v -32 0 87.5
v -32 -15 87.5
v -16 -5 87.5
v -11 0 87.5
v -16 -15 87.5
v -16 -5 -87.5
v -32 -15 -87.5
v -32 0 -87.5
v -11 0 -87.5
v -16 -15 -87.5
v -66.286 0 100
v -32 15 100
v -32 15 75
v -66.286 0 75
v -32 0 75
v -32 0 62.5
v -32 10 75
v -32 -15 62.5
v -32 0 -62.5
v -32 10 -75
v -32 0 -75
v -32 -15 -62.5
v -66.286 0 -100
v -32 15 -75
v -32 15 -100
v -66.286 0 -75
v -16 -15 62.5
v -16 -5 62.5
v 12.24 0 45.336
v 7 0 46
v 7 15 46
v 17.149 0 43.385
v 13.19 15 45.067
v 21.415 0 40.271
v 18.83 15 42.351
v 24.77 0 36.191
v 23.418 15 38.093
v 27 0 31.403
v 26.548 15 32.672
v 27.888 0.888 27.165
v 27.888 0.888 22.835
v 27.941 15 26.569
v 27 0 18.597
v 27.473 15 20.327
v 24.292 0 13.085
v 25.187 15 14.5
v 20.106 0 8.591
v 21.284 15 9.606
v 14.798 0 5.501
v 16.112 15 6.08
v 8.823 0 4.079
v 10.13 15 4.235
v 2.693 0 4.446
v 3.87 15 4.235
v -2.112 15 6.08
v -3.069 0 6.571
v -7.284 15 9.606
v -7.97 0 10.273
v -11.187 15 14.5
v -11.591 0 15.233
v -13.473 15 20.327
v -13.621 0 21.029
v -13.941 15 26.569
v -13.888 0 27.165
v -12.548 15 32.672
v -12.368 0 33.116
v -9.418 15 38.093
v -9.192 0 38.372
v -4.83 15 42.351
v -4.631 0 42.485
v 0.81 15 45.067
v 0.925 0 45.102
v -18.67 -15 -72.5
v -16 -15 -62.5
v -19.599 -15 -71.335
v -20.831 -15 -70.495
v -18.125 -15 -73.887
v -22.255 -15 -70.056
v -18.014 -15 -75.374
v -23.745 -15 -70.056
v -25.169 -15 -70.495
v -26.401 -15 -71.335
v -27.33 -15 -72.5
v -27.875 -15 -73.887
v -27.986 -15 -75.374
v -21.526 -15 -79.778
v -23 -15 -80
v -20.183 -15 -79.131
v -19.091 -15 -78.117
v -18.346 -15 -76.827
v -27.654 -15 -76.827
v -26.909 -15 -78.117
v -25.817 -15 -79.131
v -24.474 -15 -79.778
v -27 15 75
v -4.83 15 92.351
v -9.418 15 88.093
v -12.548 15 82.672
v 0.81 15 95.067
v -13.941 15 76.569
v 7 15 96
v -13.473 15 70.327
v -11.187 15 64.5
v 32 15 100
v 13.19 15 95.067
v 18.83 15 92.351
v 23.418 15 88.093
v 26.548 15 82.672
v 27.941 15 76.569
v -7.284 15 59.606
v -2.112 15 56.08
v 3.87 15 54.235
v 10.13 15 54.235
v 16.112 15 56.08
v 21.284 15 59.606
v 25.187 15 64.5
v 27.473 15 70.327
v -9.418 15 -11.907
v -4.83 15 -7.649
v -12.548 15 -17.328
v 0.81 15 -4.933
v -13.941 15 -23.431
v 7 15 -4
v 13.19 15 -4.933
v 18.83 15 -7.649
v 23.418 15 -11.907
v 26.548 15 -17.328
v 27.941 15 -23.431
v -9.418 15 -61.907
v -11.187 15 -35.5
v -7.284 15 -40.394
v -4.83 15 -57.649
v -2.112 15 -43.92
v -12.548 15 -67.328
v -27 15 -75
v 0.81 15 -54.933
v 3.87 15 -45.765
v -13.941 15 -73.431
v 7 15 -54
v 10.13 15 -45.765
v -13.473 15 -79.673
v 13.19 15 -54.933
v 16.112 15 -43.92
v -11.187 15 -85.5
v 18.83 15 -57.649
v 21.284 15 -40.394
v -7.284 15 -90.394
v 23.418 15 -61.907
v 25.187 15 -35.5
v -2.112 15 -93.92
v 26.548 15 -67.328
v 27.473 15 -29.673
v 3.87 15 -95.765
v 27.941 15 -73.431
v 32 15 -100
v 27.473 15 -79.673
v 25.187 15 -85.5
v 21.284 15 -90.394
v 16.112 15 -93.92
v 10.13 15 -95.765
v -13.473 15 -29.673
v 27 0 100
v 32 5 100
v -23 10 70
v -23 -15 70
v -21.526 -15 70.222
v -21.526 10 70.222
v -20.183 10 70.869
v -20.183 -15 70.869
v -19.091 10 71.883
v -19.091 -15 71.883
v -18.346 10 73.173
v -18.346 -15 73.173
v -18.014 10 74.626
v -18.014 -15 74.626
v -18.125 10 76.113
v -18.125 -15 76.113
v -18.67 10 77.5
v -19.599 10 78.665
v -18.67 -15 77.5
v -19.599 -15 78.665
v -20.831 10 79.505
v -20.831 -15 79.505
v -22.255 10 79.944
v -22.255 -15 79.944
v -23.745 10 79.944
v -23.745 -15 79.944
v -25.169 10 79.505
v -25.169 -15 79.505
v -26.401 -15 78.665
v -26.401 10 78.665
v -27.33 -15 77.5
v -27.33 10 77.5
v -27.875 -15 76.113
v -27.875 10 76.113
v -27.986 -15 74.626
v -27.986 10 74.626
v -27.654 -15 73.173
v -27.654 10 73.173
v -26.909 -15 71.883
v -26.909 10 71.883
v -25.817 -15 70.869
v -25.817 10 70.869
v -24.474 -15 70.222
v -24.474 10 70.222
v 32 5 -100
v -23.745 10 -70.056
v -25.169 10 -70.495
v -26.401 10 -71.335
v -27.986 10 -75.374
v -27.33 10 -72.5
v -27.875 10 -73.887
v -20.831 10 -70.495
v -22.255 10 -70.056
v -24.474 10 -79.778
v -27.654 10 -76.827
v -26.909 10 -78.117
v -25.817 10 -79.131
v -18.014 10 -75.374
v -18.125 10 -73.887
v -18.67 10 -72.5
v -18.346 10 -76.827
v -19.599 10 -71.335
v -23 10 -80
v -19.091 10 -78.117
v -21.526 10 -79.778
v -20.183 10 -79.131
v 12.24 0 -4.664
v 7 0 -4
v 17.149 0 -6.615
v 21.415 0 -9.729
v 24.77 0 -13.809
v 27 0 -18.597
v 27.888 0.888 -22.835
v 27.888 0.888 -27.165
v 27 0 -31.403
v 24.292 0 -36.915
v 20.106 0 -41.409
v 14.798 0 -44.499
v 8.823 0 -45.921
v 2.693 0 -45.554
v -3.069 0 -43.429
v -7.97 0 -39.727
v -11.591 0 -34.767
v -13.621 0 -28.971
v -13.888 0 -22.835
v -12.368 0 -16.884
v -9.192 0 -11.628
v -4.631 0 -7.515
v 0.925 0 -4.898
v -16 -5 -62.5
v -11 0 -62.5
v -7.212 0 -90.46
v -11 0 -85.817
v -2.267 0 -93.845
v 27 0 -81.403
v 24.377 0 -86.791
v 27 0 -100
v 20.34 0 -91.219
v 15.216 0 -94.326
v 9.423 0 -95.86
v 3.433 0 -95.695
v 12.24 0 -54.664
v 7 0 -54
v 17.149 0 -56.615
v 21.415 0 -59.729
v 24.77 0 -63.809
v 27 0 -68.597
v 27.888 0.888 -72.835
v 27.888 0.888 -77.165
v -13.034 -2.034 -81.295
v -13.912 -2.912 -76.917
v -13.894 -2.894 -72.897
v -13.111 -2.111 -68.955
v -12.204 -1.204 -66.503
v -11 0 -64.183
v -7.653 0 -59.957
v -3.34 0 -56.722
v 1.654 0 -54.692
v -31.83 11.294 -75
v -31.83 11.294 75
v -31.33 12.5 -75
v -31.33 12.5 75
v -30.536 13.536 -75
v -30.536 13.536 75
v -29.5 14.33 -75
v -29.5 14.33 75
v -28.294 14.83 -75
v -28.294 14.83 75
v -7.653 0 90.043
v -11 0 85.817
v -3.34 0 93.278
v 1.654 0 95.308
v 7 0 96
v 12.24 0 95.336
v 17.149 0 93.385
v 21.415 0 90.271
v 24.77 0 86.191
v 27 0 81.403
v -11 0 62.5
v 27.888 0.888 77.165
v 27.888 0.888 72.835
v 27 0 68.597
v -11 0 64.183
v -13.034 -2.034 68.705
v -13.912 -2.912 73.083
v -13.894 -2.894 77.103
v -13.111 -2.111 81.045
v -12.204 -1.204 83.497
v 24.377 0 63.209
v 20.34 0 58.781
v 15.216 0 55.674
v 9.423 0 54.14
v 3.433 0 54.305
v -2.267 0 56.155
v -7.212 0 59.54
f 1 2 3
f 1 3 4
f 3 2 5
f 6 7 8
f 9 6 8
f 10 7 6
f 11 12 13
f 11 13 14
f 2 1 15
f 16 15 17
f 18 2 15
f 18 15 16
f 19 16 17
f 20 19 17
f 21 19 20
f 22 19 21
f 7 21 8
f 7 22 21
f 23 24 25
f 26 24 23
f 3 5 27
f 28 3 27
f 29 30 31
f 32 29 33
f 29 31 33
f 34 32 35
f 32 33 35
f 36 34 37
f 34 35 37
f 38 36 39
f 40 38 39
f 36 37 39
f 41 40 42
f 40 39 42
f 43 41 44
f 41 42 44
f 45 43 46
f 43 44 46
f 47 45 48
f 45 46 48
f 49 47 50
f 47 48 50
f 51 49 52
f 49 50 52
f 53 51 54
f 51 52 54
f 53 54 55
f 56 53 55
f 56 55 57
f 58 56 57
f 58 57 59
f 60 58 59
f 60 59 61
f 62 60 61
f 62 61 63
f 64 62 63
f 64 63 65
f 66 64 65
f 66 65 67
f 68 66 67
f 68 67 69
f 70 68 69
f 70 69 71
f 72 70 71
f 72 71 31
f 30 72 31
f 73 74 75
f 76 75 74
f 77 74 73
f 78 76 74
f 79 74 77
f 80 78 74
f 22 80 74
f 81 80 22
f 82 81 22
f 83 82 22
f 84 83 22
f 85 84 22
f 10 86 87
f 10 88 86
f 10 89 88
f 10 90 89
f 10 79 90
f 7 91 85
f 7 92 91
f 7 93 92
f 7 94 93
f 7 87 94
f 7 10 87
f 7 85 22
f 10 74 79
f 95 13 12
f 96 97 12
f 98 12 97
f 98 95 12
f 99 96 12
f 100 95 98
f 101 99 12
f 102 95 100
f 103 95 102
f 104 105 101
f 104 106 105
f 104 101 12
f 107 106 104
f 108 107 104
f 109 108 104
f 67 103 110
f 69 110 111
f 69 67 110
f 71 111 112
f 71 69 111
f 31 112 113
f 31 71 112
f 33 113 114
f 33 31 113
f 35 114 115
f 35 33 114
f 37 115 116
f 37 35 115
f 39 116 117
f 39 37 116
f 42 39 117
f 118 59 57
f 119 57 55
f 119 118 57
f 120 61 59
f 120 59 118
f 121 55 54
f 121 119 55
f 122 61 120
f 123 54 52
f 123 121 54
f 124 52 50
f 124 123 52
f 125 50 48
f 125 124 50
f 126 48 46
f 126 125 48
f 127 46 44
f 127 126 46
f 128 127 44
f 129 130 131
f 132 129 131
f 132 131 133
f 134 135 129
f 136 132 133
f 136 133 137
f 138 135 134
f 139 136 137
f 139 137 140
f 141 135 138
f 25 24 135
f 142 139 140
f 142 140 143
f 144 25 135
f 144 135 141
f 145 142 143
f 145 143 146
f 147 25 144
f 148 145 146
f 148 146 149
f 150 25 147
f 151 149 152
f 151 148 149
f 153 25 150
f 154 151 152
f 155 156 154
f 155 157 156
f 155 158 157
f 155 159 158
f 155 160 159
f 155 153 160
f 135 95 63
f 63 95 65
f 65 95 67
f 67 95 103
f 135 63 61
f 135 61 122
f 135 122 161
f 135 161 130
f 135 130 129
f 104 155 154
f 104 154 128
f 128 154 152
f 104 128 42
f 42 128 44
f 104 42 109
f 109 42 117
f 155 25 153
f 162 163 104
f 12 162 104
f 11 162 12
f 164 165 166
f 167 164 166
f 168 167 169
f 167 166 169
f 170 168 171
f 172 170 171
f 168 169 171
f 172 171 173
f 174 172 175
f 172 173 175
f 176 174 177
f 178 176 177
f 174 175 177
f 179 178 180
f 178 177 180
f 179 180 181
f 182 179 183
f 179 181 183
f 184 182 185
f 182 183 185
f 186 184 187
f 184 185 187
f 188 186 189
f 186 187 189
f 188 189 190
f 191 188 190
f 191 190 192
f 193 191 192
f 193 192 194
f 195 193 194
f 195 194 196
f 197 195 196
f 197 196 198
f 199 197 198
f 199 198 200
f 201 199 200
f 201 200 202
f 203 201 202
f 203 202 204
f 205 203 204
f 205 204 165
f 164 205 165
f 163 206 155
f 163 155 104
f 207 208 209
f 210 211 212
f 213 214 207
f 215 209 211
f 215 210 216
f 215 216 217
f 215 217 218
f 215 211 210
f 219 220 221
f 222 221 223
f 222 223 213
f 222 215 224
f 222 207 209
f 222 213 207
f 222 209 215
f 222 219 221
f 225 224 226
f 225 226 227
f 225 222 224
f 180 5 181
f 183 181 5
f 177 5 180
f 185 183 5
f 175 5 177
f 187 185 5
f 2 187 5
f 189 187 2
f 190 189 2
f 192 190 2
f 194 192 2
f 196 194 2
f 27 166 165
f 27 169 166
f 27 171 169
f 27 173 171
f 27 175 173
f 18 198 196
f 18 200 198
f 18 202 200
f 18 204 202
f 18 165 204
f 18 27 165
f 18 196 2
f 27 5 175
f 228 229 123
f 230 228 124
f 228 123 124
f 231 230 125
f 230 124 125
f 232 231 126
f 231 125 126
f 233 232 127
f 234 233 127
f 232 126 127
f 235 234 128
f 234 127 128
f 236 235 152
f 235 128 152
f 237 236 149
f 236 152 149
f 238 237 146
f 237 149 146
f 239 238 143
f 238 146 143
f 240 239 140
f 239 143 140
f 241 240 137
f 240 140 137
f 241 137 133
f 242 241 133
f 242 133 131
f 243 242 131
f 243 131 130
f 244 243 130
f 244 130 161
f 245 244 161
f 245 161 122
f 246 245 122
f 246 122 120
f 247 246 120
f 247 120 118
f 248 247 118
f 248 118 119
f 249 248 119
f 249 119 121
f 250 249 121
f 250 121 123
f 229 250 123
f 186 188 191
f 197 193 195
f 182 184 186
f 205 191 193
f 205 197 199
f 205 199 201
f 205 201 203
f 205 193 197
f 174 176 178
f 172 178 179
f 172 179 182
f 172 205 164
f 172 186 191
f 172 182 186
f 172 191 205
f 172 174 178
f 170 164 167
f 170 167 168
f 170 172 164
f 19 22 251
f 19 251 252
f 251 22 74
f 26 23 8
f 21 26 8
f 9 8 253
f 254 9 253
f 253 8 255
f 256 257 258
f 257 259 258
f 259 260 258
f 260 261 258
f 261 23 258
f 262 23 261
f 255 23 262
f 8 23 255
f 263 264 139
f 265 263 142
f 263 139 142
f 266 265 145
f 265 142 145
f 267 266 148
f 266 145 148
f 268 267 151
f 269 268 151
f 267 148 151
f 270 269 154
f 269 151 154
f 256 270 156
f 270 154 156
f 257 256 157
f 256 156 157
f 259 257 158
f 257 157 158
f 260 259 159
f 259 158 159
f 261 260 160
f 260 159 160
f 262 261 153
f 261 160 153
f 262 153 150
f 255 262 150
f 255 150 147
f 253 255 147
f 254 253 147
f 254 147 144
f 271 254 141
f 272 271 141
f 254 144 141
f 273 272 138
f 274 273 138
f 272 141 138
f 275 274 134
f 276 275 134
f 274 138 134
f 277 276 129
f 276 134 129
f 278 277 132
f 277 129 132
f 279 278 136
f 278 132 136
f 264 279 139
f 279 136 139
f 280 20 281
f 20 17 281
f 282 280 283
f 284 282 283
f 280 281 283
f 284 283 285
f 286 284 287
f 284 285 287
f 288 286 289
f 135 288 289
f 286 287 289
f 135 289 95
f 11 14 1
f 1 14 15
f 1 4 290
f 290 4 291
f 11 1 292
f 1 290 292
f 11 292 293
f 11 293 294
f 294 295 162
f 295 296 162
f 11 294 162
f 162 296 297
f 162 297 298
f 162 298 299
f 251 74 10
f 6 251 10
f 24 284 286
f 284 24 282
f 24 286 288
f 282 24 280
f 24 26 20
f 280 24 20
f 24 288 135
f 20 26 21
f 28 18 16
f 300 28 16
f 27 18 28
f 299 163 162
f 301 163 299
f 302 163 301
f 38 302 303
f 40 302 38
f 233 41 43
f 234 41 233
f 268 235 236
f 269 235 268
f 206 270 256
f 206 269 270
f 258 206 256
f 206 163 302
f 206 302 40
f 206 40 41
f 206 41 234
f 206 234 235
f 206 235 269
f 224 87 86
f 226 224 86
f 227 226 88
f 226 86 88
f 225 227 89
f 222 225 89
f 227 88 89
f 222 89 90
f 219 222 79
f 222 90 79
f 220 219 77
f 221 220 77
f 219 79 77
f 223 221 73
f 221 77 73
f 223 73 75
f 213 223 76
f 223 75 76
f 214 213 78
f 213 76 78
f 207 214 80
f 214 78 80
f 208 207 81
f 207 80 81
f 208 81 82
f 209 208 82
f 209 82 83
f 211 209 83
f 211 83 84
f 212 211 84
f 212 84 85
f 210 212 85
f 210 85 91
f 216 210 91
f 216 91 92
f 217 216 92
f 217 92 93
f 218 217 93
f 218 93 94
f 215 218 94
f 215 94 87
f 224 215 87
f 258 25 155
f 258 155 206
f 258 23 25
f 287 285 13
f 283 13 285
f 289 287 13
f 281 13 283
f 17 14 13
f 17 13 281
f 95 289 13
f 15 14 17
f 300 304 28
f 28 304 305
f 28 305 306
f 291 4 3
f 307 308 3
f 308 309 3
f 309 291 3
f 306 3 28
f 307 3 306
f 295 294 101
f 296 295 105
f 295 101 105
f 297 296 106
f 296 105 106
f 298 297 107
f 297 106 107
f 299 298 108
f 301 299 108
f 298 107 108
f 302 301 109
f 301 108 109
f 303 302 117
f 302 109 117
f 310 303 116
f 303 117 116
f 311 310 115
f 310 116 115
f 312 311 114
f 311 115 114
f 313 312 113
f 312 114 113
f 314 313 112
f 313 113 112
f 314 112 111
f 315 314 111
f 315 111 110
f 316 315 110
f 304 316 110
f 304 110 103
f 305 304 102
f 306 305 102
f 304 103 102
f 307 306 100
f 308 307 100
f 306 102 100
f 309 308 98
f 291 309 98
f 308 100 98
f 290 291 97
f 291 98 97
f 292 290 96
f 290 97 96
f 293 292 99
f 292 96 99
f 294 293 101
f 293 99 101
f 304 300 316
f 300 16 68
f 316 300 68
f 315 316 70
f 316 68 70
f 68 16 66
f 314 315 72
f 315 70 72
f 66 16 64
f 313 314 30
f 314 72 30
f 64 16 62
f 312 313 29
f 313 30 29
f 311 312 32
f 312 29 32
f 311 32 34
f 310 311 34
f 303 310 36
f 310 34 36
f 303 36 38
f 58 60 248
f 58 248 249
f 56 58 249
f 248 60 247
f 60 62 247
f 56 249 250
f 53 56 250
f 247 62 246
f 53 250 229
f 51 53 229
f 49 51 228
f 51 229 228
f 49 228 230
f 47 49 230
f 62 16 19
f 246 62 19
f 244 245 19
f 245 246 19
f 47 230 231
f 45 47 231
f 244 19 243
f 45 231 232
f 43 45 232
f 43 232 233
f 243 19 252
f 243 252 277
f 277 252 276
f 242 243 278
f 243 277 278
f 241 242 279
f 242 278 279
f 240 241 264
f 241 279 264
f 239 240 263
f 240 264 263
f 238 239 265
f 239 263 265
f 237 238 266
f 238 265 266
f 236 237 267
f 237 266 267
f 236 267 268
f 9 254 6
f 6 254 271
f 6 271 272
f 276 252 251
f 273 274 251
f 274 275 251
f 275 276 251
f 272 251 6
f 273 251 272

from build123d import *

# Parameters (mm, degrees)
EXTRUDE_1_DEPTH     = 15
SKETCH_3_3_W        = 35
SKETCH_3_3_H        = 25
EXTRUDE_2_DEPTH     = 15
CUT_EXTRUDE_1_DEPTH = 245
SKETCH_7_R          = 21
CUT_EXTRUDE_2_DEPTH = 15
SKETCH_8_R          = 5
CUT_EXTRUDE_4_DEPTH = 10
EXTRUDE_START       = 15
SKETCH_8_5_W        = 16
SKETCH_8_5_H        = 25
SKETCH_8_5_R        = 5
EXTRUDE_4_DEPTH     = 15
CHAMFER_1_SIZE      = 5
FILLET_1_R          = 5
CHAMFER_2_SIZE      = 5


with BuildPart() as part:
    # Эскиз3 → Бобышка-Вытянуть1 (new body)
    with BuildSketch(Plane(origin=(0, 0, 0), x_dir=(1, 0, 0), z_dir=(0, 1, 0))):
        Polygon((-32, -75), (-32, 75), (-32, 100), (32, 100), (32, -100), (-32, -100), align=None)
    extrude(amount=EXTRUDE_1_DEPTH)

    # Эскиз3<3> → Бобышка-Вытянуть2 (add)
    with BuildSketch(Plane(origin=(0, 0, 0), x_dir=(1, 0, 0), z_dir=(0, 1, 0))):
        with Locations((-49.5, 87.5)):
            Rectangle(SKETCH_3_3_W, SKETCH_3_3_H)
        with Locations((-49.5, -87.5)):
            Rectangle(SKETCH_3_3_W, SKETCH_3_3_H)
    extrude(amount=EXTRUDE_2_DEPTH)

    # Эскиз6 → Вырез-Вытянуть1 (cut)
    with BuildSketch(Plane.XY.offset(110)):
        Polygon((-67, 15), (-32, 15), (-67, -0.312590504), align=None)
    extrude(amount=-CUT_EXTRUDE_1_DEPTH, mode=Mode.SUBTRACT)

    # Эскиз7 → Вырез-Вытянуть2 (cut)
    with BuildSketch(Plane(origin=(0, 15, 0), x_dir=(1, 0, 0), z_dir=(0, 1, 0))):
        with Locations(Location((7, 75, 0), (0, 0, 270))):
            Circle(SKETCH_7_R)
        with Locations(Location((7, 25, 0), (0, 0, 270))):
            Circle(SKETCH_7_R)
        with Locations(Location((7, -25, 0), (0, 0, 270))):
            Circle(SKETCH_7_R)
        with Locations(Location((7, -75, 0), (0, 0, 270))):
            Circle(SKETCH_7_R)
    extrude(amount=-CUT_EXTRUDE_2_DEPTH, mode=Mode.SUBTRACT)

    # Эскиз8 → Вырез-Вытянуть4 (cut)
    with BuildSketch(Plane(origin=(0, 0, 0), x_dir=(-1, 0, 0), z_dir=(0, -1, 0))):
        with Locations(Location((23, 75, 0), (0, 0, 90))):
            Circle(SKETCH_8_R)
        with Locations(Location((23, -75, 0), (0, 0, 90))):
            Circle(SKETCH_8_R)
    extrude(amount=-CUT_EXTRUDE_4_DEPTH, mode=Mode.SUBTRACT)

    # Эскиз8<5> → Бобышка-Вытянуть4 (add)
    # profile 1 of 2: a face of its own
    with BuildSketch(Plane(origin=(0, 0, 0), x_dir=(-1, 0, 0), z_dir=(0, -1, 0)).offset(EXTRUDE_START)):
        with Locations((24, 75)):
            Rectangle(SKETCH_8_5_W, SKETCH_8_5_H)
        with Locations(Location((23, 75, 0), (0, 0, 90))):
            Circle(SKETCH_8_5_R, mode=Mode.SUBTRACT)
    # profile 2 of 2: a face of its own
    with BuildSketch(Plane(origin=(0, 0, 0), x_dir=(-1, 0, 0), z_dir=(0, -1, 0)).offset(EXTRUDE_START)):
        with Locations((24, -75)):
            Rectangle(SKETCH_8_5_W, SKETCH_8_5_H)
        with Locations(Location((23, -75, 0), (0, 0, 90))):
            Circle(SKETCH_8_5_R, mode=Mode.SUBTRACT)
    extrude(amount=-EXTRUDE_4_DEPTH)

    # Фаска1
    # the kernel refuses this chamfer: 5 mm, written as the material it takes off along each edge
    with BuildSketch(Plane(origin=(32, 0, -112.85841494), x_dir=(0.027495876610586317, 0.9996219169112968, 0), z_dir=(0, 0, 1))) as chamfer_1_piece_1:
        Polygon((CHAMFER_1_SIZE * 0.999621916911, CHAMFER_1_SIZE * 0.0274958766106), (-CHAMFER_1_SIZE * 0.0274958766106, CHAMFER_1_SIZE * 0.999621916911), (0, 0), align=None)
    extrude(amount=225.71682988, mode=Mode.SUBTRACT)

    # Скругление1
    fillet_1_edges = [part.edges().sort_by_distance(p)[0] for p in [
        (-32, 15, 0),
    ]]
    fillet(fillet_1_edges, radius=FILLET_1_R)

    # Фаска2
    # the kernel refuses this chamfer: 5 mm, written as the material it adds along each edge
    with BuildSketch(Plane(origin=(-16, 0, 87.5), x_dir=(0.9996219169112968, 0.027495876610586372, 0), z_dir=(0, 0, -1))) as chamfer_2_piece_1_section:
        Polygon((CHAMFER_2_SIZE * 0.999621916911, CHAMFER_2_SIZE * 0.0274958766106), (-CHAMFER_2_SIZE * 0.0274958766106, CHAMFER_2_SIZE * 0.999621916911), (0, 0), align=None)
    chamfer_2_piece_1 = extrude(amount=25, mode=Mode.PRIVATE)
    chamfer_2_piece_1 = chamfer_2_piece_1 - Plane(origin=(7, -1.841726954, 75), x_dir=(0, 0, 1), z_dir=(0, 1, 0)) * Cylinder(21, 70, mode=Mode.PRIVATE)
    add(chamfer_2_piece_1)
    with BuildSketch(Plane(origin=(-16, 0, -62.5), x_dir=(0.9996219169112968, 0.027495876610586372, 0), z_dir=(0, 0, -1))) as chamfer_2_piece_2_section:
        Polygon((CHAMFER_2_SIZE * 0.999621916911, CHAMFER_2_SIZE * 0.0274958766106), (-CHAMFER_2_SIZE * 0.0274958766106, CHAMFER_2_SIZE * 0.999621916911), (0, 0), align=None)
    chamfer_2_piece_2 = extrude(amount=25, mode=Mode.PRIVATE)
    chamfer_2_piece_2 = chamfer_2_piece_2 - Plane(origin=(7, -1.841726954, -75), x_dir=(0, 0, 1), z_dir=(0, 1, 0)) * Cylinder(21, 70, mode=Mode.PRIVATE)
    add(chamfer_2_piece_2)


solid = part.part
